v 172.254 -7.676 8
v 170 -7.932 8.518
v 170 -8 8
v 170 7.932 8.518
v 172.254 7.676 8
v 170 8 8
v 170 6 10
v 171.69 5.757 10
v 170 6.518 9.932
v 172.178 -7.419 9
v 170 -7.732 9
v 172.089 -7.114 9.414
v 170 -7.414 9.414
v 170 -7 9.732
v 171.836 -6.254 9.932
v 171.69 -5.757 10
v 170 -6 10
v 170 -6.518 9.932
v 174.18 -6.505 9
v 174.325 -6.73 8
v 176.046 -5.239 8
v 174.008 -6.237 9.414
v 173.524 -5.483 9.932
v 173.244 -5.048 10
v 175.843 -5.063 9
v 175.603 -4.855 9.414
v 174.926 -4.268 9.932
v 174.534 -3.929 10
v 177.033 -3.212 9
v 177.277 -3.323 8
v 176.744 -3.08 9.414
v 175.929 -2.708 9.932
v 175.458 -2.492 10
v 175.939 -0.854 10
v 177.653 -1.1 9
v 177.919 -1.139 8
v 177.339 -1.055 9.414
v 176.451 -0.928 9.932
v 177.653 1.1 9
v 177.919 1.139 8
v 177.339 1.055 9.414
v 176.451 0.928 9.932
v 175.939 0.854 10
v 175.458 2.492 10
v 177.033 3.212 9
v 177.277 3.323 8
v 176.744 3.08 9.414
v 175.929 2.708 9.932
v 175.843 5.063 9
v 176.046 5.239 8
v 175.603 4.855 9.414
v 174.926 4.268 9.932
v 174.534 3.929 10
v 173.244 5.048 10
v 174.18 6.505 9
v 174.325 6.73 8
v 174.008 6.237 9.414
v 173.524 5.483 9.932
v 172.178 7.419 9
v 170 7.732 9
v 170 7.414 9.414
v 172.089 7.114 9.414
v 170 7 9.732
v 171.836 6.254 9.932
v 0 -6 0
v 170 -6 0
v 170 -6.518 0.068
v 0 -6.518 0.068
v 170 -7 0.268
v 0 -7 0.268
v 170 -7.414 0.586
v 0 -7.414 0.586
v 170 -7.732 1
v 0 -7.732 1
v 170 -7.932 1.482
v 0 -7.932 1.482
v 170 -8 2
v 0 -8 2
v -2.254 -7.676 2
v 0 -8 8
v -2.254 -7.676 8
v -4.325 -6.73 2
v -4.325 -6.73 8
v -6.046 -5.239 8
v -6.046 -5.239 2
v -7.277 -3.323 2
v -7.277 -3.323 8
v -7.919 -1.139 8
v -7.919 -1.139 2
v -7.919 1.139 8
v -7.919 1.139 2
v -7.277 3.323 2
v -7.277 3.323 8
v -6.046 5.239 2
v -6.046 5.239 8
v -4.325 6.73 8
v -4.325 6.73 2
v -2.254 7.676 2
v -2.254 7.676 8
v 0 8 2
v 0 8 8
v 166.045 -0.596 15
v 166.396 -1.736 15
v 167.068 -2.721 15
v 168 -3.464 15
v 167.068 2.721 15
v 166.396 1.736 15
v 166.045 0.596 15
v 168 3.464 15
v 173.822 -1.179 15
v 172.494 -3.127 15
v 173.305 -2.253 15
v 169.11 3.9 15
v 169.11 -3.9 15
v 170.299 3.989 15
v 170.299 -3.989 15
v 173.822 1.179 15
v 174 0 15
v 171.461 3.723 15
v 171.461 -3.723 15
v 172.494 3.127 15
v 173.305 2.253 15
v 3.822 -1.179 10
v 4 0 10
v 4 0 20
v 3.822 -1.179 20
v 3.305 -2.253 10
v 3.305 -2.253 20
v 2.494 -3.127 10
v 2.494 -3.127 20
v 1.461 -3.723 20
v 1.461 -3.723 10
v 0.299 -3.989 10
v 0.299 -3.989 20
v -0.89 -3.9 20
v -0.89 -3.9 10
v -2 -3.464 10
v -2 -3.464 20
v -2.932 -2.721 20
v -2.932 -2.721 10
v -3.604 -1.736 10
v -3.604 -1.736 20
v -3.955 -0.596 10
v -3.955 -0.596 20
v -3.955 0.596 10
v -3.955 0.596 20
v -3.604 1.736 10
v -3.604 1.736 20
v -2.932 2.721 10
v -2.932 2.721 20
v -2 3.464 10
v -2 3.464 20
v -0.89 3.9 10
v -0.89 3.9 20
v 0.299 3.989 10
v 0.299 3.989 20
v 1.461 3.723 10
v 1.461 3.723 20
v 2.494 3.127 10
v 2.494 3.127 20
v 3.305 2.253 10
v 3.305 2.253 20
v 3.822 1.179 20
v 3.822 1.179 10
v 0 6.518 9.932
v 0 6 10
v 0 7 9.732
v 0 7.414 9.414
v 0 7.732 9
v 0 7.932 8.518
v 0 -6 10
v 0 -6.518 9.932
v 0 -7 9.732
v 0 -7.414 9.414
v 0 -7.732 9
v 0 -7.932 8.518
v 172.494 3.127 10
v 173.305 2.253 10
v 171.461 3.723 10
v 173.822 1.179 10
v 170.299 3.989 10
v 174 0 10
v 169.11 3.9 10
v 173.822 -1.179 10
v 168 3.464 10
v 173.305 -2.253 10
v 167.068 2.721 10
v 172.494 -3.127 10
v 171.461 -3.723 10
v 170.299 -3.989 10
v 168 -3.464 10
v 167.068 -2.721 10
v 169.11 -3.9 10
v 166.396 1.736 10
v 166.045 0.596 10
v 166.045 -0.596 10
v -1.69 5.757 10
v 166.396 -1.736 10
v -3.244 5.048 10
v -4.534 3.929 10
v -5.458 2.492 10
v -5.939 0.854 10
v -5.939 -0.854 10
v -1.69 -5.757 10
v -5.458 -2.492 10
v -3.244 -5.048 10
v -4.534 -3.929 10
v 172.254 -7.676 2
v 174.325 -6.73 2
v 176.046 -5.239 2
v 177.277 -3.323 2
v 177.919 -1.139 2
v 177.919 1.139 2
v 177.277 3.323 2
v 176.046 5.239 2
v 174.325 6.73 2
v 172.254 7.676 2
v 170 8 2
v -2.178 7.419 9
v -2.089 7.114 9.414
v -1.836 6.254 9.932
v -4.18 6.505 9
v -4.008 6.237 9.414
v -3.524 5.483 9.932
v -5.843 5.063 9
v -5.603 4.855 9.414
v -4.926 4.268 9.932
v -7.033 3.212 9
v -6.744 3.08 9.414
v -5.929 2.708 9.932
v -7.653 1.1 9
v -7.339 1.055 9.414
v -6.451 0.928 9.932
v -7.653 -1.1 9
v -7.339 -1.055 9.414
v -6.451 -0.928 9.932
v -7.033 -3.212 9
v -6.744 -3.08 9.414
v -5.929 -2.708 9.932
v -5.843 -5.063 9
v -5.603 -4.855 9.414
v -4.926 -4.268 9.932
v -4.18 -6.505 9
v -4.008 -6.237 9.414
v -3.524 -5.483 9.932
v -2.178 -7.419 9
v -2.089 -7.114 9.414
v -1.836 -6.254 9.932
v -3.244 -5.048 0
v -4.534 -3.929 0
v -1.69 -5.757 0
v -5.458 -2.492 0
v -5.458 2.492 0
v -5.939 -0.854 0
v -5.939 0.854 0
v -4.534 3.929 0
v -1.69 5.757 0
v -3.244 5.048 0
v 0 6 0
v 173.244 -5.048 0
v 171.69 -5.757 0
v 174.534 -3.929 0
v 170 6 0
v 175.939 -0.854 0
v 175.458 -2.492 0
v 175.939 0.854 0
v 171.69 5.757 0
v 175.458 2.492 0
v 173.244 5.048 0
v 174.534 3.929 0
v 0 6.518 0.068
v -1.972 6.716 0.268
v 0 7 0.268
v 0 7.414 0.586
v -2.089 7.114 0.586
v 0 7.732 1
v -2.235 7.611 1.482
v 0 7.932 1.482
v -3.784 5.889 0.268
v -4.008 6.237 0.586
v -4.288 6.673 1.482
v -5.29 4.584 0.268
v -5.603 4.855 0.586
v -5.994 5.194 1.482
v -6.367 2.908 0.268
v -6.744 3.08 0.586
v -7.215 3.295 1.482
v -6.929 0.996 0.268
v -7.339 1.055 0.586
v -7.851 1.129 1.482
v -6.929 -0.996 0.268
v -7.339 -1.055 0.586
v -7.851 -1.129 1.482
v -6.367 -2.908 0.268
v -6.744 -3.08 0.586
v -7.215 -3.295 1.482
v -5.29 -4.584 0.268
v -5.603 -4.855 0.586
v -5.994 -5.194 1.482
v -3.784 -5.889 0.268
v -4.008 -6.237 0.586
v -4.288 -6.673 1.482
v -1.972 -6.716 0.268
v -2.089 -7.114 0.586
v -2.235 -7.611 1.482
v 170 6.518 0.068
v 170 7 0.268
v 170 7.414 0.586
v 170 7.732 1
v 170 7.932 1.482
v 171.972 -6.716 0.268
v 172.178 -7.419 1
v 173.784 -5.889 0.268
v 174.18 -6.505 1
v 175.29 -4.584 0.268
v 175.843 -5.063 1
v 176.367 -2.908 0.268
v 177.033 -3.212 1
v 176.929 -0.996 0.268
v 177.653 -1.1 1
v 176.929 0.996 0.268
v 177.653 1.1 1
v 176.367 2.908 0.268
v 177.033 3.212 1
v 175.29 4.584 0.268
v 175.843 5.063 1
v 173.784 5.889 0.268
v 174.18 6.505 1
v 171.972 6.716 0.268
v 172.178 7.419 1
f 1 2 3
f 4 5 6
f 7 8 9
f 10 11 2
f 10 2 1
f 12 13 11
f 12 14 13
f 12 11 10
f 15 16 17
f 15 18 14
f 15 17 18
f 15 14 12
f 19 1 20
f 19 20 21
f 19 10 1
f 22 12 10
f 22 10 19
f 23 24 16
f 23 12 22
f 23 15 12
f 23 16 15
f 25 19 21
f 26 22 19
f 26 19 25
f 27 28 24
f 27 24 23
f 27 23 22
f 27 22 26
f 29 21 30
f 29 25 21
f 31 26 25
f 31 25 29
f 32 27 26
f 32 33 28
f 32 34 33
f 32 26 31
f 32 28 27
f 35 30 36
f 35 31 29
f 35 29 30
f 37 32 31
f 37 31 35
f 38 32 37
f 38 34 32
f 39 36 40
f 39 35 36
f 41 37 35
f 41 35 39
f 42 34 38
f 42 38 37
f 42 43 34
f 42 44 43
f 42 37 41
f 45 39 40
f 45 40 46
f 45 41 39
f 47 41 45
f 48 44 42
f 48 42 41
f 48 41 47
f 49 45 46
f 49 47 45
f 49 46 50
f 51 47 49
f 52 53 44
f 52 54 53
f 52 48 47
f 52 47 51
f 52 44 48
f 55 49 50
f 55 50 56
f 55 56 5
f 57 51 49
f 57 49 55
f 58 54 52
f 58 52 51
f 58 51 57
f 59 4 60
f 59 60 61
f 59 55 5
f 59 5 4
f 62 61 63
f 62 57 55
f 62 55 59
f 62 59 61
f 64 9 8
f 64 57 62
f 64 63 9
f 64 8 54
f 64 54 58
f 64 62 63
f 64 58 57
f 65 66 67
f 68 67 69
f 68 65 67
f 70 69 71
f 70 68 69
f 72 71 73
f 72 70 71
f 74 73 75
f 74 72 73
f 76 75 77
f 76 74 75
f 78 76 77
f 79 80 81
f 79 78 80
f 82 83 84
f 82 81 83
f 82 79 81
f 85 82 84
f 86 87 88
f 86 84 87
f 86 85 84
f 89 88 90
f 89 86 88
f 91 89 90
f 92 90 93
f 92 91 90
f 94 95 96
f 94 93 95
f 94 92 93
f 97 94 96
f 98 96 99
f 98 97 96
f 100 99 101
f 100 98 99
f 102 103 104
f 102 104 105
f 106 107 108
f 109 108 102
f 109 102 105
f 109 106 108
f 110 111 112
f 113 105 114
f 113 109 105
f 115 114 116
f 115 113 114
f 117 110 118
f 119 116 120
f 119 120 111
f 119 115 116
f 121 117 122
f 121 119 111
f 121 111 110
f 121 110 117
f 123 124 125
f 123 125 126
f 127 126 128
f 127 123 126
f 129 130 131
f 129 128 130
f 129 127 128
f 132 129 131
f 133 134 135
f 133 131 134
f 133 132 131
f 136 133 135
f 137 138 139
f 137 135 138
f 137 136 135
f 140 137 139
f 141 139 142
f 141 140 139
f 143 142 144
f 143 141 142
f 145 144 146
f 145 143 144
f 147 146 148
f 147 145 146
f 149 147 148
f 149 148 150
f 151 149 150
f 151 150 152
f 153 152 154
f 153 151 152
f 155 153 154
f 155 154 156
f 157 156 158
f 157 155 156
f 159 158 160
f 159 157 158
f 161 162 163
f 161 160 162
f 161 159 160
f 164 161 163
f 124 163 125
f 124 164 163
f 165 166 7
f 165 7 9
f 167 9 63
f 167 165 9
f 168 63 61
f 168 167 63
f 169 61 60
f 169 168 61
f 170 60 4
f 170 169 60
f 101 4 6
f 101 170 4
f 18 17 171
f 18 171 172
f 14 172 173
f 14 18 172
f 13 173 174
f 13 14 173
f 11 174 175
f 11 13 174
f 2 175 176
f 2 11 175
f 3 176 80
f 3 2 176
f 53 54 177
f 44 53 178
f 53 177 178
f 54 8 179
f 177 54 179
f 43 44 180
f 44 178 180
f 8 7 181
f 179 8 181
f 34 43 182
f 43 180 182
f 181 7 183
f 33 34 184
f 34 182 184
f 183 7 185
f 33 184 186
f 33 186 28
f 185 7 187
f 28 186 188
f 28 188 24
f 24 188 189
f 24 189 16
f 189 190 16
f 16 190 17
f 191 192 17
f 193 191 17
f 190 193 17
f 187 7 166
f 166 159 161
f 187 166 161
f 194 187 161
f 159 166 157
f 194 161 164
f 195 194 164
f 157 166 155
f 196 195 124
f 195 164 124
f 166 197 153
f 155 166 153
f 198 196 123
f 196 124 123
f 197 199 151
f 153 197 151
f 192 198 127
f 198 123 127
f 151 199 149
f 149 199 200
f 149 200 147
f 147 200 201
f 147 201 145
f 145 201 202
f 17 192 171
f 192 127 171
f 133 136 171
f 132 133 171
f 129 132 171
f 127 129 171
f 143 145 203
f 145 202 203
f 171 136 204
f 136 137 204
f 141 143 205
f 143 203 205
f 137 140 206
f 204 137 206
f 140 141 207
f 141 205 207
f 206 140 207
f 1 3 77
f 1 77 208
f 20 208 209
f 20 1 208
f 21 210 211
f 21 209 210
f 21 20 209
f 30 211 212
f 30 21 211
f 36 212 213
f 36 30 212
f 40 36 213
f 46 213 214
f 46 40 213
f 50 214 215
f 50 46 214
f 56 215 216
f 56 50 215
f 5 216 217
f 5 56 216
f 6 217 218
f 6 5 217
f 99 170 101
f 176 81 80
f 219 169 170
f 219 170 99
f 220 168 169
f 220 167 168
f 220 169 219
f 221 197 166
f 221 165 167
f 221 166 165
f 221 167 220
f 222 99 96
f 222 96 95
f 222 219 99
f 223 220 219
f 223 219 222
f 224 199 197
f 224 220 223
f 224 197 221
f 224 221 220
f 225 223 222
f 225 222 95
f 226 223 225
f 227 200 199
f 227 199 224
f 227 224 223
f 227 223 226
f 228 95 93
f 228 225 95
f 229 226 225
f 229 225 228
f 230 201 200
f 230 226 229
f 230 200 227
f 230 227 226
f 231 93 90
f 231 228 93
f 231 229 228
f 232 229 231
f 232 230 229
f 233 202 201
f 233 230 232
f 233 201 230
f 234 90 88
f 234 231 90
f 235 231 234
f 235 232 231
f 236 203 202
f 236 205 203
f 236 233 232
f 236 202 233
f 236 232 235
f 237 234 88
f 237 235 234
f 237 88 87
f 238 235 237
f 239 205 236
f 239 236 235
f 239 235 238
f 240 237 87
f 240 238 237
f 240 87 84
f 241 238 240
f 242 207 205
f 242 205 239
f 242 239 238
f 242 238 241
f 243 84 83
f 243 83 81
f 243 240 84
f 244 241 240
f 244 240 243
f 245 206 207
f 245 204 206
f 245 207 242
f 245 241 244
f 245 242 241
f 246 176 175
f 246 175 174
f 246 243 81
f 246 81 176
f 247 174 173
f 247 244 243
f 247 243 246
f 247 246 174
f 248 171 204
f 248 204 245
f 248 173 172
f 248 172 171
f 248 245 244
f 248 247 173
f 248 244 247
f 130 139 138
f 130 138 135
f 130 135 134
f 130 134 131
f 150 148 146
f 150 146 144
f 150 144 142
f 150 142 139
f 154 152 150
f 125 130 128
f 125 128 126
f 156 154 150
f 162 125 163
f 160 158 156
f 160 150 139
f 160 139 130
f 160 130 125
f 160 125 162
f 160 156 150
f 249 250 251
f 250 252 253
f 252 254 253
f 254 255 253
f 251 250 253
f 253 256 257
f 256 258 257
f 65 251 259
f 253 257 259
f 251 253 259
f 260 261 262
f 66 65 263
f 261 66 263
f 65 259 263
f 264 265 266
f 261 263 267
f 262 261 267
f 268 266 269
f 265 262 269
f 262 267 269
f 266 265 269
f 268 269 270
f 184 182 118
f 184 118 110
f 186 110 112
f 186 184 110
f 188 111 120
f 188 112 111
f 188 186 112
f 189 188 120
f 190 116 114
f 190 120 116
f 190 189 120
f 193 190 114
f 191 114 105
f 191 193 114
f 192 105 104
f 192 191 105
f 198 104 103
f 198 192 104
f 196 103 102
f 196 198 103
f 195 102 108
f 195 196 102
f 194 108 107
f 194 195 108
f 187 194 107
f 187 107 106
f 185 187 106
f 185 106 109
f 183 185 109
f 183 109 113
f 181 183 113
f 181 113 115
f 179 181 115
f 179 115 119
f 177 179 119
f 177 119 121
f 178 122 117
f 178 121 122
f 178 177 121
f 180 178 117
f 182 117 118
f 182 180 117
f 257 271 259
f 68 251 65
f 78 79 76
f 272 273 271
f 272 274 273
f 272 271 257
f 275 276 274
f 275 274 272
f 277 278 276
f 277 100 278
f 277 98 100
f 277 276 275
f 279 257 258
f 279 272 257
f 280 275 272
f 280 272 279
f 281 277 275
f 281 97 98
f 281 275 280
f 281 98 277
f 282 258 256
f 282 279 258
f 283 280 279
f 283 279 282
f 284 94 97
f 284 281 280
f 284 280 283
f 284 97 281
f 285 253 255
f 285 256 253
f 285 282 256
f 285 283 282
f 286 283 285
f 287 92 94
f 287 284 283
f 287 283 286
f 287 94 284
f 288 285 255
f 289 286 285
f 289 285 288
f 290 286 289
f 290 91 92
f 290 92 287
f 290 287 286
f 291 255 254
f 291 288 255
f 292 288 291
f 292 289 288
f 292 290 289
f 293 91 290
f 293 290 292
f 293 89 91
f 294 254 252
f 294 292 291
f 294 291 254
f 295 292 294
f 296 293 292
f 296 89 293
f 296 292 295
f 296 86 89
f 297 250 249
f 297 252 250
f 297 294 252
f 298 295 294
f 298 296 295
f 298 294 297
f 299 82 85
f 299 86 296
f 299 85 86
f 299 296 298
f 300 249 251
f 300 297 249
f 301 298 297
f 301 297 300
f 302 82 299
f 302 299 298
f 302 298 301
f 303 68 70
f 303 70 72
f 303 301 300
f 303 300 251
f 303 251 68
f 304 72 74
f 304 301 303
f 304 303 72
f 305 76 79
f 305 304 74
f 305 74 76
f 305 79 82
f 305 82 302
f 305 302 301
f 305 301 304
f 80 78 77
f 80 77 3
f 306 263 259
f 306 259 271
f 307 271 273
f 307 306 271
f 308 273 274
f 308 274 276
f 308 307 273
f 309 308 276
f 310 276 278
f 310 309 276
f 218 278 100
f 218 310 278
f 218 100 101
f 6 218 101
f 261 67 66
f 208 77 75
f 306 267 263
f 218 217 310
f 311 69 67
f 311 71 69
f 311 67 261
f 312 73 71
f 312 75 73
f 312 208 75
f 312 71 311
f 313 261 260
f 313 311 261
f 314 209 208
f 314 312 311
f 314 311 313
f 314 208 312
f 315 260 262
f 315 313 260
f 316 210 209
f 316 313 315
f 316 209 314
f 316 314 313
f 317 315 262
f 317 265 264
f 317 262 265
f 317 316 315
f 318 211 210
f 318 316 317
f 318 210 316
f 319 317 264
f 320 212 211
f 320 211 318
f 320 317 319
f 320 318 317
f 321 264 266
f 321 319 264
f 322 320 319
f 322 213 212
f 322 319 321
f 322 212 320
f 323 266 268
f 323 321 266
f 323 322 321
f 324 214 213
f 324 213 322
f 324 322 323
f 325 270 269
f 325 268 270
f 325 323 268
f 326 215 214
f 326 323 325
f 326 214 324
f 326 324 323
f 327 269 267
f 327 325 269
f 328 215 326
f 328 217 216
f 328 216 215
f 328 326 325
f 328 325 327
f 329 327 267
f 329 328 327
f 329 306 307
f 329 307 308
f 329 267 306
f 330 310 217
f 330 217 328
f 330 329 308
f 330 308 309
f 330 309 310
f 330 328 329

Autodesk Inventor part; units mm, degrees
ref_plane "XZ Plane" through (0, 0, 0) normal (0, 1, 0) x (-1, 0, 0)
ref_plane "XY Plane" through (0, 0, 0) normal (0, 0, 1) x (1, 0, 0)
sketch "Sketch1" plane through (0, 0, 0) normal (0, 0, 1) x (1, 0, 0)
  circle A0 centre (0, 0) radius 8
  dimension "d0" = 16
extrude "Extrusion1" add sketch "Sketch1" along normal blind 10
ref_plane "Work Plane1" through (8, 0, 0) normal (1, 0, 0) x (0, 1, 0)
sketch "Sketch2" plane through (8, 0, 0) normal (1, 0, 0) x (0, 1, 0)
  line L0 (-8, 0) -> (-8, 10) projected
  line L1 (8, 10) -> (-8, 10)
  line L2 (-8, 10) -> (-8, 0)
  line L3 (-8, 0) -> (8, 0)
  line L4 (8, 0) -> (8, 10)
  line L5 (8, 10) -> (-8, 0) construction
  line L6 (-8, 10) -> (8, 0) construction
  point P0 (0, 0)
  point P1 (0, 5)
extrude "Extrusion2" add sketch "Sketch2" along normal blind 162 and the other way blind 8
sketch "Sketch3" plane through (0, 0, 10) normal (0, 0, 1) x (1, 0, 0)
  arc A0 (0, 8) -> (0, -8) centre (0, 0) ccw projected
  line L0 (0, 0) -> (170, 0)
  line L1 (170, -8) -> (0, -8) projected
  line L2 (0, 0) -> (170, 0) construction
  line L3 (170, 8) -> (170, -8) projected
  circle A1 centre (170, 0) radius 8
  dimension "d8" = 170
  dimension "d9" = 0
extrude "Extrusion3" add sketch "Sketch3" against normal blind 10
ref_plane "Work Plane2" through (-8, 0, 0) normal (1, 0, 0) x (0, 1, 0)
sketch "Sketch4" plane through (-8, 0, 0) normal (1, 0, 0) x (0, 1, 0)
  line L0 (-8, 0) -> (-8, 10) projected
  line L1 (8, 7.5) -> (-8, 7.5)
  line L2 (-8, 7.5) -> (-8, 2.5)
  line L3 (-8, 2.5) -> (8, 2.5)
  line L4 (8, 2.5) -> (8, 7.5)
  line L5 (8, 7.5) -> (-8, 2.5) construction
  line L6 (-8, 7.5) -> (8, 2.5) construction
  line L7 (8, 10) -> (-8, 10) projected
  line L8 (8, 0) -> (8, 10) projected
  line L9 (-8, 10) -> (-8, 0) projected
  line L10 (-8, 0) -> (8, 0) projected
  point P0 (0, 0)
  point P1 (0, 5)
  dimension "d13" = 5
extrude "Extrusion4" [suppressed]
sketch "Sketch5" plane through (0, -8, 7.5) normal (0, 0, 1) x (1, 0, 0)
  circle A0 centre (0, 8) radius 4
  dimension "d16" = 8
extrude "Extrusion5" [suppressed]
sketch "Sketch6" plane through (0, 0, 10) normal (0, 0, 1) x (1, 0, 0)
  arc A0 (170, -8) -> (170, 8) centre (170, 0) ccw projected
  circle A1 centre (170, 0) radius 4
  point P0 (0, 0)
  dimension "d21" = 8
extrude "Extrusion6" add sketch "Sketch6" along normal blind 5
sketch "Sketch7" plane through (0, 0, 10) normal (0, 0, 1) x (1, 0, 0)
  circle A0 centre (0, 0) radius 4
  dimension "d24" = 8
extrude "Extrusion7" add sketch "Sketch7" along normal blind 10
fillet "Fillet1" radius 2 8 edges at (178, 0, 0) (85, -8, 0) (-8, 0, 0) (85, 8, 0) (178, 0, 10) (85, -8, 10) (-8, 0, 10) (85, 8, 10)
properties part number "Acoplador" material "Iron, Ductile"
